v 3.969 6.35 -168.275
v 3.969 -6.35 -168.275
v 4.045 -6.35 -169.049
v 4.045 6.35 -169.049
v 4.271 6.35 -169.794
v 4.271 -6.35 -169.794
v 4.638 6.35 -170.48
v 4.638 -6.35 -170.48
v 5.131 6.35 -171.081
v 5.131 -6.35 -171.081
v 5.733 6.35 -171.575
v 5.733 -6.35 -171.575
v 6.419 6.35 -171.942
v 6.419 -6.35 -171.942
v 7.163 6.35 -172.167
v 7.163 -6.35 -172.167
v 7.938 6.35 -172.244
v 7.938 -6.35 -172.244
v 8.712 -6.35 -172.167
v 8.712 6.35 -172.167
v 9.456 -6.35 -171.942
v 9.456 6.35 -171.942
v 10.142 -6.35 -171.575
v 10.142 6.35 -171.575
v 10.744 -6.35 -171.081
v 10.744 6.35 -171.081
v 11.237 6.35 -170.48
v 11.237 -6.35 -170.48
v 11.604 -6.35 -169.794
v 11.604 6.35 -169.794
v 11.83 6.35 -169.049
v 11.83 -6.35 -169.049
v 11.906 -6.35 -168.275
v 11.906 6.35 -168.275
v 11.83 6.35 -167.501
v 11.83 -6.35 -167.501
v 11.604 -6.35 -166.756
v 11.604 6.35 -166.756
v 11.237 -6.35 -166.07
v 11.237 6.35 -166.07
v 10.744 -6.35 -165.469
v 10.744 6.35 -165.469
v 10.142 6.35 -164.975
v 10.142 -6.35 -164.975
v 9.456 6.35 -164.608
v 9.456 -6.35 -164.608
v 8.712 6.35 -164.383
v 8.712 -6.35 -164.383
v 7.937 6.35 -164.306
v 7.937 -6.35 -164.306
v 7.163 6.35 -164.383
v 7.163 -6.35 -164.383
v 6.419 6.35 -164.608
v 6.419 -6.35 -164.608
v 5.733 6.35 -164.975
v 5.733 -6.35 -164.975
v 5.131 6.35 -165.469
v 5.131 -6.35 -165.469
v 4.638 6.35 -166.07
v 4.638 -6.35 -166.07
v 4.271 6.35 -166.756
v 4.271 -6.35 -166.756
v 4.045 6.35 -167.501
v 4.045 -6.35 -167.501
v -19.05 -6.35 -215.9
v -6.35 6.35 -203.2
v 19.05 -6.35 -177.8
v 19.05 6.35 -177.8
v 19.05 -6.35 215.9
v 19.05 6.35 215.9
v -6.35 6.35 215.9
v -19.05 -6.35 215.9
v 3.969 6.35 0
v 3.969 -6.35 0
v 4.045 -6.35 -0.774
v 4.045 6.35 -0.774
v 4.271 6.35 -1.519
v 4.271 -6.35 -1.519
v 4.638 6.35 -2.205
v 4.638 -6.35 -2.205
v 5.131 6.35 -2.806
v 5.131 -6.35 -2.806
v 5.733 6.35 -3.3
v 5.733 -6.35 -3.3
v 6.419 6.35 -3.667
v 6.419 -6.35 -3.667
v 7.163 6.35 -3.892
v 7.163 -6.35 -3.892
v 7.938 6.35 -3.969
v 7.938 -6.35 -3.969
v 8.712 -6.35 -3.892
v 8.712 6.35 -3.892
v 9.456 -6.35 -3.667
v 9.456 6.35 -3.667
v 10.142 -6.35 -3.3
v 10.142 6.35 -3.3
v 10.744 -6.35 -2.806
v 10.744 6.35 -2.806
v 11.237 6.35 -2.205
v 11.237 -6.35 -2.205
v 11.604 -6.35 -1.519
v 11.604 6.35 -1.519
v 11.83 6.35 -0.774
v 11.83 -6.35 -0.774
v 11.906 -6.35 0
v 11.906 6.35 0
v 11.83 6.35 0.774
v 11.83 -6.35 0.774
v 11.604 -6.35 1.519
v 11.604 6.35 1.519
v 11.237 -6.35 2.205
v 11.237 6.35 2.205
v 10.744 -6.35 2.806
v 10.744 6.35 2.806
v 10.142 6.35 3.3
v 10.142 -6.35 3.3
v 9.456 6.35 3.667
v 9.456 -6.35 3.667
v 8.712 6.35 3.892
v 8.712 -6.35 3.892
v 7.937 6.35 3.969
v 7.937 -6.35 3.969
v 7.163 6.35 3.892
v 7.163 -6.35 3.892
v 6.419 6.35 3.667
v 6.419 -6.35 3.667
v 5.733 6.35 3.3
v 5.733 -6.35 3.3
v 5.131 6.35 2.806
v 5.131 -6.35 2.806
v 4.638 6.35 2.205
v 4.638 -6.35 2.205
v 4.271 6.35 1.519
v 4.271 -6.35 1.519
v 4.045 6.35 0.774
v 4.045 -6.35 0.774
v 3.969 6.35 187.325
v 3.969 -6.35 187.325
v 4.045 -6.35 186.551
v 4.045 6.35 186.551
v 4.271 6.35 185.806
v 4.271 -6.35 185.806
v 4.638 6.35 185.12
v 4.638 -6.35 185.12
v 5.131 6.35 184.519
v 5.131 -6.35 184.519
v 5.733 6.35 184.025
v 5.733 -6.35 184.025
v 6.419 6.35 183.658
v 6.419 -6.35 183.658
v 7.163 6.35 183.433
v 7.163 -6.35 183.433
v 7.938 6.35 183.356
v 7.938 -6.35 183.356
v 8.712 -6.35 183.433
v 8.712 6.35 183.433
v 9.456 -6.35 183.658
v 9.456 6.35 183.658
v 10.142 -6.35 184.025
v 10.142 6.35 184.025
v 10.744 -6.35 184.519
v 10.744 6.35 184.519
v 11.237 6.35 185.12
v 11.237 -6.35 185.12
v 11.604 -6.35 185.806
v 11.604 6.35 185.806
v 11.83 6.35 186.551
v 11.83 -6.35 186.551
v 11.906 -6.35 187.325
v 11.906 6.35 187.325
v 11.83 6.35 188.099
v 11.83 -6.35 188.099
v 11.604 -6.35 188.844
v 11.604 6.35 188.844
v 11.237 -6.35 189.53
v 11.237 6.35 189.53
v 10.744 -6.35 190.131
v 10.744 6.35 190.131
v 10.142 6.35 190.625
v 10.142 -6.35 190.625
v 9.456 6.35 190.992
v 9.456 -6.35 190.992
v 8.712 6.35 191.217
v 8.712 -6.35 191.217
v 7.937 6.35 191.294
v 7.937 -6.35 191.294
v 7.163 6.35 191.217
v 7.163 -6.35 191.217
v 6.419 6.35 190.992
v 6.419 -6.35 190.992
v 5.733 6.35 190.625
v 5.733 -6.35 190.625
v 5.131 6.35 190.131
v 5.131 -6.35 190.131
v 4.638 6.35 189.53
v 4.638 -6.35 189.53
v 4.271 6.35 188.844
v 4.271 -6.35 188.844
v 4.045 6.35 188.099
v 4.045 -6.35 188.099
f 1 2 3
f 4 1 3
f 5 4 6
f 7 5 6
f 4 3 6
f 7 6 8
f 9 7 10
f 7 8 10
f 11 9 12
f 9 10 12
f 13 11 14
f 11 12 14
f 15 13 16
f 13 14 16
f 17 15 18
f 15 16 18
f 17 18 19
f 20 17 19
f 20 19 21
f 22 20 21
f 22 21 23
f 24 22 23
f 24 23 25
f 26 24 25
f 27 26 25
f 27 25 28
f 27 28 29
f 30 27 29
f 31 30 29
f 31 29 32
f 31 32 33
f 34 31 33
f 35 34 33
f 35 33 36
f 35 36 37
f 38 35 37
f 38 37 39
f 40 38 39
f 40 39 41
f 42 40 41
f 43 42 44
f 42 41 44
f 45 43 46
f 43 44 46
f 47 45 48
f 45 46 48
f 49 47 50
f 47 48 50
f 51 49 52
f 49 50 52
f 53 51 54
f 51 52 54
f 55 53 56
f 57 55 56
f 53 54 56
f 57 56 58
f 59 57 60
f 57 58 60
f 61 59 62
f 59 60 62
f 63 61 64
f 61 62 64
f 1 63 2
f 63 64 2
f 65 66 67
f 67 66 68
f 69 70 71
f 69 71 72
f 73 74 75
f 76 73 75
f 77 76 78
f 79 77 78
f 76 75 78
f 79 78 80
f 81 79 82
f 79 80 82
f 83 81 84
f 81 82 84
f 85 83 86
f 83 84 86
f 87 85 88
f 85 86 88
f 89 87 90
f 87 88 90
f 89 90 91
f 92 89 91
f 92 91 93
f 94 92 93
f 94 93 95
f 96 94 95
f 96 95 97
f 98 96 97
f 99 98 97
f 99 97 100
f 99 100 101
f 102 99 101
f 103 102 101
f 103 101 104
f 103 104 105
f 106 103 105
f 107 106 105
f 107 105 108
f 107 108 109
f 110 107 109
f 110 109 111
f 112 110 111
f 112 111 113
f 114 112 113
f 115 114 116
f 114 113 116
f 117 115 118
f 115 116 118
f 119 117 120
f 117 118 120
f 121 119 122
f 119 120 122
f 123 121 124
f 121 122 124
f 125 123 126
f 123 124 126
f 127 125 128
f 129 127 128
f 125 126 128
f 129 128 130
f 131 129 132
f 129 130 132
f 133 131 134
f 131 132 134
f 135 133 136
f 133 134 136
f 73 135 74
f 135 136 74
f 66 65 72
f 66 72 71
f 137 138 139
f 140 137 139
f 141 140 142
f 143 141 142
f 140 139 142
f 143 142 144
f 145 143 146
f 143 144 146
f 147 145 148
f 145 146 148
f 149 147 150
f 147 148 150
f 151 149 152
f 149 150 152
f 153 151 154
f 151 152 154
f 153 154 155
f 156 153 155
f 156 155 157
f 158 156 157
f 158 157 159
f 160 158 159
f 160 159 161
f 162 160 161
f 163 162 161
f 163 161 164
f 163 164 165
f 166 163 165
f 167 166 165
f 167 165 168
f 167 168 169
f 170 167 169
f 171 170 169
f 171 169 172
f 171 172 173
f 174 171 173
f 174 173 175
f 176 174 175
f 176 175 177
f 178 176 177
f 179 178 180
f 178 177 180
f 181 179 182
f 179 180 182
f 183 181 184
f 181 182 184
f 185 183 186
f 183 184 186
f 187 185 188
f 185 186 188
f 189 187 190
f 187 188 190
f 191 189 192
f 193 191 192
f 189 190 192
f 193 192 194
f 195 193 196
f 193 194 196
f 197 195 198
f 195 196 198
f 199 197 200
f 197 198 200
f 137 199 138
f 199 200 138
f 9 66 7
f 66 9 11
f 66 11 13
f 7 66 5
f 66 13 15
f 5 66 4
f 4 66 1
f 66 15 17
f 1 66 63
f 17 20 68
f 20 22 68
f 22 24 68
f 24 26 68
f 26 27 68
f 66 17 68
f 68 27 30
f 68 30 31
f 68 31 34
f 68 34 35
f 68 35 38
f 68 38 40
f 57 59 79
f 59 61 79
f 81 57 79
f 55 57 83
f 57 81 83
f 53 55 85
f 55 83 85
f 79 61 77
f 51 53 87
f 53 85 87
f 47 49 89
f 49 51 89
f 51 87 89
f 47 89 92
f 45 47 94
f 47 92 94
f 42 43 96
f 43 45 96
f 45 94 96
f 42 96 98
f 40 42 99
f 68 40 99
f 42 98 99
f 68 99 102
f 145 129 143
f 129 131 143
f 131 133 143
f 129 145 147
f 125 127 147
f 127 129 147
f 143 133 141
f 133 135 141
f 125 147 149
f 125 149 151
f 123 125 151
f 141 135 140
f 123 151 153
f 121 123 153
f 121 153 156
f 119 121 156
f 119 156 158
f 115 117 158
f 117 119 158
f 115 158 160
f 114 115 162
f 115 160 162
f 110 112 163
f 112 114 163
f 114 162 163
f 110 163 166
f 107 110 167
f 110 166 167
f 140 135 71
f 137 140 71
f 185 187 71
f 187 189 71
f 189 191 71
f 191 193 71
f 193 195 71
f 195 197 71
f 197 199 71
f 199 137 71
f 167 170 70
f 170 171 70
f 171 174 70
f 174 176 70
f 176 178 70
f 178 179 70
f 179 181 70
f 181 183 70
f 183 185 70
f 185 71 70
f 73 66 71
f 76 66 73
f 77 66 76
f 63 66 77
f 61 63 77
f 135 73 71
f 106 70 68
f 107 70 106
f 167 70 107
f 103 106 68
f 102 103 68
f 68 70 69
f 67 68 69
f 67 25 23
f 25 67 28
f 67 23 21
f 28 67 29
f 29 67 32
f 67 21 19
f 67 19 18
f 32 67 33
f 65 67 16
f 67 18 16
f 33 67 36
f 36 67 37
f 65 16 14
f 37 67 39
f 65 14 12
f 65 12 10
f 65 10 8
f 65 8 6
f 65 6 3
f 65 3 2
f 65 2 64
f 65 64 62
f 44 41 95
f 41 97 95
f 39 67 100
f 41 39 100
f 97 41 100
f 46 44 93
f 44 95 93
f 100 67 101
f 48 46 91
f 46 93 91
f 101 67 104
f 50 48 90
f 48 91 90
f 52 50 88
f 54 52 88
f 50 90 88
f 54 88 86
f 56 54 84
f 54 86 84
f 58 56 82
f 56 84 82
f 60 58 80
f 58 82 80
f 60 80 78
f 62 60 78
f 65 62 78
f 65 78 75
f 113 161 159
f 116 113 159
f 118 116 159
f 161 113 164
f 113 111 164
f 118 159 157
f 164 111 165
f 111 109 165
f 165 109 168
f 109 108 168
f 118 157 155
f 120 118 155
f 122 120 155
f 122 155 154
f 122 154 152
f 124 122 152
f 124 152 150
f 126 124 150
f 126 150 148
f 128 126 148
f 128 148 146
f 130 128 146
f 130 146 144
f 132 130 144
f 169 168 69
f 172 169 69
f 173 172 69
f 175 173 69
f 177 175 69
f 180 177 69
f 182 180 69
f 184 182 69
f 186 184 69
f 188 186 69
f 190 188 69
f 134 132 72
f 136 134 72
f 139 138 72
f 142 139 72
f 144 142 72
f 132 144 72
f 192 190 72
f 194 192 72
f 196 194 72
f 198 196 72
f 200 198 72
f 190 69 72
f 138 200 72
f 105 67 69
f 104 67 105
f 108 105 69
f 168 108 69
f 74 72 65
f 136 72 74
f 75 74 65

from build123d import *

# Parameters (mm, degrees)
BOSS_EXTRUDE1_DEPTH            = 215.9
CUT_EXTRUDE1_DEPTH             = 218.110576665
F_5_16_0_3125_DIAMETER_HOLE1_D = 7.9375


with BuildPart() as part:
    # Sketch1 → Boss-Extrude1 (new, symmetric)
    with BuildSketch(Plane.XY):
        Polygon((-19.05, -6.35), (-6.35, 6.35), (19.05, 6.35), (19.05, -6.35), align=None)
    extrude(amount=BOSS_EXTRUDE1_DEPTH, both=True)

    # Sketch2 → Cut-Extrude1 (cut, through all)
    with BuildSketch(Plane(origin=(0, 6.35, 0), x_dir=(1, 0, 0), z_dir=(0, 1, 0))):
        Polygon((19.05, 215.9), (-19.05, 215.9), (19.05, 177.8), align=None)
    extrude(amount=-CUT_EXTRUDE1_DEPTH, mode=Mode.SUBTRACT)

    # 5/16 (0.3125) Diameter Hole1 (through all)
    with Locations(Plane(origin=(0, 6.35, 0), x_dir=(1, 0, 0), z_dir=(0, 1, 0))):
        with Locations((7.9375, 168.275), (7.9375, 0), (7.9375, -187.325)):
            Hole(F_5_16_0_3125_DIAMETER_HOLE1_D / 2)


solid = part.part
